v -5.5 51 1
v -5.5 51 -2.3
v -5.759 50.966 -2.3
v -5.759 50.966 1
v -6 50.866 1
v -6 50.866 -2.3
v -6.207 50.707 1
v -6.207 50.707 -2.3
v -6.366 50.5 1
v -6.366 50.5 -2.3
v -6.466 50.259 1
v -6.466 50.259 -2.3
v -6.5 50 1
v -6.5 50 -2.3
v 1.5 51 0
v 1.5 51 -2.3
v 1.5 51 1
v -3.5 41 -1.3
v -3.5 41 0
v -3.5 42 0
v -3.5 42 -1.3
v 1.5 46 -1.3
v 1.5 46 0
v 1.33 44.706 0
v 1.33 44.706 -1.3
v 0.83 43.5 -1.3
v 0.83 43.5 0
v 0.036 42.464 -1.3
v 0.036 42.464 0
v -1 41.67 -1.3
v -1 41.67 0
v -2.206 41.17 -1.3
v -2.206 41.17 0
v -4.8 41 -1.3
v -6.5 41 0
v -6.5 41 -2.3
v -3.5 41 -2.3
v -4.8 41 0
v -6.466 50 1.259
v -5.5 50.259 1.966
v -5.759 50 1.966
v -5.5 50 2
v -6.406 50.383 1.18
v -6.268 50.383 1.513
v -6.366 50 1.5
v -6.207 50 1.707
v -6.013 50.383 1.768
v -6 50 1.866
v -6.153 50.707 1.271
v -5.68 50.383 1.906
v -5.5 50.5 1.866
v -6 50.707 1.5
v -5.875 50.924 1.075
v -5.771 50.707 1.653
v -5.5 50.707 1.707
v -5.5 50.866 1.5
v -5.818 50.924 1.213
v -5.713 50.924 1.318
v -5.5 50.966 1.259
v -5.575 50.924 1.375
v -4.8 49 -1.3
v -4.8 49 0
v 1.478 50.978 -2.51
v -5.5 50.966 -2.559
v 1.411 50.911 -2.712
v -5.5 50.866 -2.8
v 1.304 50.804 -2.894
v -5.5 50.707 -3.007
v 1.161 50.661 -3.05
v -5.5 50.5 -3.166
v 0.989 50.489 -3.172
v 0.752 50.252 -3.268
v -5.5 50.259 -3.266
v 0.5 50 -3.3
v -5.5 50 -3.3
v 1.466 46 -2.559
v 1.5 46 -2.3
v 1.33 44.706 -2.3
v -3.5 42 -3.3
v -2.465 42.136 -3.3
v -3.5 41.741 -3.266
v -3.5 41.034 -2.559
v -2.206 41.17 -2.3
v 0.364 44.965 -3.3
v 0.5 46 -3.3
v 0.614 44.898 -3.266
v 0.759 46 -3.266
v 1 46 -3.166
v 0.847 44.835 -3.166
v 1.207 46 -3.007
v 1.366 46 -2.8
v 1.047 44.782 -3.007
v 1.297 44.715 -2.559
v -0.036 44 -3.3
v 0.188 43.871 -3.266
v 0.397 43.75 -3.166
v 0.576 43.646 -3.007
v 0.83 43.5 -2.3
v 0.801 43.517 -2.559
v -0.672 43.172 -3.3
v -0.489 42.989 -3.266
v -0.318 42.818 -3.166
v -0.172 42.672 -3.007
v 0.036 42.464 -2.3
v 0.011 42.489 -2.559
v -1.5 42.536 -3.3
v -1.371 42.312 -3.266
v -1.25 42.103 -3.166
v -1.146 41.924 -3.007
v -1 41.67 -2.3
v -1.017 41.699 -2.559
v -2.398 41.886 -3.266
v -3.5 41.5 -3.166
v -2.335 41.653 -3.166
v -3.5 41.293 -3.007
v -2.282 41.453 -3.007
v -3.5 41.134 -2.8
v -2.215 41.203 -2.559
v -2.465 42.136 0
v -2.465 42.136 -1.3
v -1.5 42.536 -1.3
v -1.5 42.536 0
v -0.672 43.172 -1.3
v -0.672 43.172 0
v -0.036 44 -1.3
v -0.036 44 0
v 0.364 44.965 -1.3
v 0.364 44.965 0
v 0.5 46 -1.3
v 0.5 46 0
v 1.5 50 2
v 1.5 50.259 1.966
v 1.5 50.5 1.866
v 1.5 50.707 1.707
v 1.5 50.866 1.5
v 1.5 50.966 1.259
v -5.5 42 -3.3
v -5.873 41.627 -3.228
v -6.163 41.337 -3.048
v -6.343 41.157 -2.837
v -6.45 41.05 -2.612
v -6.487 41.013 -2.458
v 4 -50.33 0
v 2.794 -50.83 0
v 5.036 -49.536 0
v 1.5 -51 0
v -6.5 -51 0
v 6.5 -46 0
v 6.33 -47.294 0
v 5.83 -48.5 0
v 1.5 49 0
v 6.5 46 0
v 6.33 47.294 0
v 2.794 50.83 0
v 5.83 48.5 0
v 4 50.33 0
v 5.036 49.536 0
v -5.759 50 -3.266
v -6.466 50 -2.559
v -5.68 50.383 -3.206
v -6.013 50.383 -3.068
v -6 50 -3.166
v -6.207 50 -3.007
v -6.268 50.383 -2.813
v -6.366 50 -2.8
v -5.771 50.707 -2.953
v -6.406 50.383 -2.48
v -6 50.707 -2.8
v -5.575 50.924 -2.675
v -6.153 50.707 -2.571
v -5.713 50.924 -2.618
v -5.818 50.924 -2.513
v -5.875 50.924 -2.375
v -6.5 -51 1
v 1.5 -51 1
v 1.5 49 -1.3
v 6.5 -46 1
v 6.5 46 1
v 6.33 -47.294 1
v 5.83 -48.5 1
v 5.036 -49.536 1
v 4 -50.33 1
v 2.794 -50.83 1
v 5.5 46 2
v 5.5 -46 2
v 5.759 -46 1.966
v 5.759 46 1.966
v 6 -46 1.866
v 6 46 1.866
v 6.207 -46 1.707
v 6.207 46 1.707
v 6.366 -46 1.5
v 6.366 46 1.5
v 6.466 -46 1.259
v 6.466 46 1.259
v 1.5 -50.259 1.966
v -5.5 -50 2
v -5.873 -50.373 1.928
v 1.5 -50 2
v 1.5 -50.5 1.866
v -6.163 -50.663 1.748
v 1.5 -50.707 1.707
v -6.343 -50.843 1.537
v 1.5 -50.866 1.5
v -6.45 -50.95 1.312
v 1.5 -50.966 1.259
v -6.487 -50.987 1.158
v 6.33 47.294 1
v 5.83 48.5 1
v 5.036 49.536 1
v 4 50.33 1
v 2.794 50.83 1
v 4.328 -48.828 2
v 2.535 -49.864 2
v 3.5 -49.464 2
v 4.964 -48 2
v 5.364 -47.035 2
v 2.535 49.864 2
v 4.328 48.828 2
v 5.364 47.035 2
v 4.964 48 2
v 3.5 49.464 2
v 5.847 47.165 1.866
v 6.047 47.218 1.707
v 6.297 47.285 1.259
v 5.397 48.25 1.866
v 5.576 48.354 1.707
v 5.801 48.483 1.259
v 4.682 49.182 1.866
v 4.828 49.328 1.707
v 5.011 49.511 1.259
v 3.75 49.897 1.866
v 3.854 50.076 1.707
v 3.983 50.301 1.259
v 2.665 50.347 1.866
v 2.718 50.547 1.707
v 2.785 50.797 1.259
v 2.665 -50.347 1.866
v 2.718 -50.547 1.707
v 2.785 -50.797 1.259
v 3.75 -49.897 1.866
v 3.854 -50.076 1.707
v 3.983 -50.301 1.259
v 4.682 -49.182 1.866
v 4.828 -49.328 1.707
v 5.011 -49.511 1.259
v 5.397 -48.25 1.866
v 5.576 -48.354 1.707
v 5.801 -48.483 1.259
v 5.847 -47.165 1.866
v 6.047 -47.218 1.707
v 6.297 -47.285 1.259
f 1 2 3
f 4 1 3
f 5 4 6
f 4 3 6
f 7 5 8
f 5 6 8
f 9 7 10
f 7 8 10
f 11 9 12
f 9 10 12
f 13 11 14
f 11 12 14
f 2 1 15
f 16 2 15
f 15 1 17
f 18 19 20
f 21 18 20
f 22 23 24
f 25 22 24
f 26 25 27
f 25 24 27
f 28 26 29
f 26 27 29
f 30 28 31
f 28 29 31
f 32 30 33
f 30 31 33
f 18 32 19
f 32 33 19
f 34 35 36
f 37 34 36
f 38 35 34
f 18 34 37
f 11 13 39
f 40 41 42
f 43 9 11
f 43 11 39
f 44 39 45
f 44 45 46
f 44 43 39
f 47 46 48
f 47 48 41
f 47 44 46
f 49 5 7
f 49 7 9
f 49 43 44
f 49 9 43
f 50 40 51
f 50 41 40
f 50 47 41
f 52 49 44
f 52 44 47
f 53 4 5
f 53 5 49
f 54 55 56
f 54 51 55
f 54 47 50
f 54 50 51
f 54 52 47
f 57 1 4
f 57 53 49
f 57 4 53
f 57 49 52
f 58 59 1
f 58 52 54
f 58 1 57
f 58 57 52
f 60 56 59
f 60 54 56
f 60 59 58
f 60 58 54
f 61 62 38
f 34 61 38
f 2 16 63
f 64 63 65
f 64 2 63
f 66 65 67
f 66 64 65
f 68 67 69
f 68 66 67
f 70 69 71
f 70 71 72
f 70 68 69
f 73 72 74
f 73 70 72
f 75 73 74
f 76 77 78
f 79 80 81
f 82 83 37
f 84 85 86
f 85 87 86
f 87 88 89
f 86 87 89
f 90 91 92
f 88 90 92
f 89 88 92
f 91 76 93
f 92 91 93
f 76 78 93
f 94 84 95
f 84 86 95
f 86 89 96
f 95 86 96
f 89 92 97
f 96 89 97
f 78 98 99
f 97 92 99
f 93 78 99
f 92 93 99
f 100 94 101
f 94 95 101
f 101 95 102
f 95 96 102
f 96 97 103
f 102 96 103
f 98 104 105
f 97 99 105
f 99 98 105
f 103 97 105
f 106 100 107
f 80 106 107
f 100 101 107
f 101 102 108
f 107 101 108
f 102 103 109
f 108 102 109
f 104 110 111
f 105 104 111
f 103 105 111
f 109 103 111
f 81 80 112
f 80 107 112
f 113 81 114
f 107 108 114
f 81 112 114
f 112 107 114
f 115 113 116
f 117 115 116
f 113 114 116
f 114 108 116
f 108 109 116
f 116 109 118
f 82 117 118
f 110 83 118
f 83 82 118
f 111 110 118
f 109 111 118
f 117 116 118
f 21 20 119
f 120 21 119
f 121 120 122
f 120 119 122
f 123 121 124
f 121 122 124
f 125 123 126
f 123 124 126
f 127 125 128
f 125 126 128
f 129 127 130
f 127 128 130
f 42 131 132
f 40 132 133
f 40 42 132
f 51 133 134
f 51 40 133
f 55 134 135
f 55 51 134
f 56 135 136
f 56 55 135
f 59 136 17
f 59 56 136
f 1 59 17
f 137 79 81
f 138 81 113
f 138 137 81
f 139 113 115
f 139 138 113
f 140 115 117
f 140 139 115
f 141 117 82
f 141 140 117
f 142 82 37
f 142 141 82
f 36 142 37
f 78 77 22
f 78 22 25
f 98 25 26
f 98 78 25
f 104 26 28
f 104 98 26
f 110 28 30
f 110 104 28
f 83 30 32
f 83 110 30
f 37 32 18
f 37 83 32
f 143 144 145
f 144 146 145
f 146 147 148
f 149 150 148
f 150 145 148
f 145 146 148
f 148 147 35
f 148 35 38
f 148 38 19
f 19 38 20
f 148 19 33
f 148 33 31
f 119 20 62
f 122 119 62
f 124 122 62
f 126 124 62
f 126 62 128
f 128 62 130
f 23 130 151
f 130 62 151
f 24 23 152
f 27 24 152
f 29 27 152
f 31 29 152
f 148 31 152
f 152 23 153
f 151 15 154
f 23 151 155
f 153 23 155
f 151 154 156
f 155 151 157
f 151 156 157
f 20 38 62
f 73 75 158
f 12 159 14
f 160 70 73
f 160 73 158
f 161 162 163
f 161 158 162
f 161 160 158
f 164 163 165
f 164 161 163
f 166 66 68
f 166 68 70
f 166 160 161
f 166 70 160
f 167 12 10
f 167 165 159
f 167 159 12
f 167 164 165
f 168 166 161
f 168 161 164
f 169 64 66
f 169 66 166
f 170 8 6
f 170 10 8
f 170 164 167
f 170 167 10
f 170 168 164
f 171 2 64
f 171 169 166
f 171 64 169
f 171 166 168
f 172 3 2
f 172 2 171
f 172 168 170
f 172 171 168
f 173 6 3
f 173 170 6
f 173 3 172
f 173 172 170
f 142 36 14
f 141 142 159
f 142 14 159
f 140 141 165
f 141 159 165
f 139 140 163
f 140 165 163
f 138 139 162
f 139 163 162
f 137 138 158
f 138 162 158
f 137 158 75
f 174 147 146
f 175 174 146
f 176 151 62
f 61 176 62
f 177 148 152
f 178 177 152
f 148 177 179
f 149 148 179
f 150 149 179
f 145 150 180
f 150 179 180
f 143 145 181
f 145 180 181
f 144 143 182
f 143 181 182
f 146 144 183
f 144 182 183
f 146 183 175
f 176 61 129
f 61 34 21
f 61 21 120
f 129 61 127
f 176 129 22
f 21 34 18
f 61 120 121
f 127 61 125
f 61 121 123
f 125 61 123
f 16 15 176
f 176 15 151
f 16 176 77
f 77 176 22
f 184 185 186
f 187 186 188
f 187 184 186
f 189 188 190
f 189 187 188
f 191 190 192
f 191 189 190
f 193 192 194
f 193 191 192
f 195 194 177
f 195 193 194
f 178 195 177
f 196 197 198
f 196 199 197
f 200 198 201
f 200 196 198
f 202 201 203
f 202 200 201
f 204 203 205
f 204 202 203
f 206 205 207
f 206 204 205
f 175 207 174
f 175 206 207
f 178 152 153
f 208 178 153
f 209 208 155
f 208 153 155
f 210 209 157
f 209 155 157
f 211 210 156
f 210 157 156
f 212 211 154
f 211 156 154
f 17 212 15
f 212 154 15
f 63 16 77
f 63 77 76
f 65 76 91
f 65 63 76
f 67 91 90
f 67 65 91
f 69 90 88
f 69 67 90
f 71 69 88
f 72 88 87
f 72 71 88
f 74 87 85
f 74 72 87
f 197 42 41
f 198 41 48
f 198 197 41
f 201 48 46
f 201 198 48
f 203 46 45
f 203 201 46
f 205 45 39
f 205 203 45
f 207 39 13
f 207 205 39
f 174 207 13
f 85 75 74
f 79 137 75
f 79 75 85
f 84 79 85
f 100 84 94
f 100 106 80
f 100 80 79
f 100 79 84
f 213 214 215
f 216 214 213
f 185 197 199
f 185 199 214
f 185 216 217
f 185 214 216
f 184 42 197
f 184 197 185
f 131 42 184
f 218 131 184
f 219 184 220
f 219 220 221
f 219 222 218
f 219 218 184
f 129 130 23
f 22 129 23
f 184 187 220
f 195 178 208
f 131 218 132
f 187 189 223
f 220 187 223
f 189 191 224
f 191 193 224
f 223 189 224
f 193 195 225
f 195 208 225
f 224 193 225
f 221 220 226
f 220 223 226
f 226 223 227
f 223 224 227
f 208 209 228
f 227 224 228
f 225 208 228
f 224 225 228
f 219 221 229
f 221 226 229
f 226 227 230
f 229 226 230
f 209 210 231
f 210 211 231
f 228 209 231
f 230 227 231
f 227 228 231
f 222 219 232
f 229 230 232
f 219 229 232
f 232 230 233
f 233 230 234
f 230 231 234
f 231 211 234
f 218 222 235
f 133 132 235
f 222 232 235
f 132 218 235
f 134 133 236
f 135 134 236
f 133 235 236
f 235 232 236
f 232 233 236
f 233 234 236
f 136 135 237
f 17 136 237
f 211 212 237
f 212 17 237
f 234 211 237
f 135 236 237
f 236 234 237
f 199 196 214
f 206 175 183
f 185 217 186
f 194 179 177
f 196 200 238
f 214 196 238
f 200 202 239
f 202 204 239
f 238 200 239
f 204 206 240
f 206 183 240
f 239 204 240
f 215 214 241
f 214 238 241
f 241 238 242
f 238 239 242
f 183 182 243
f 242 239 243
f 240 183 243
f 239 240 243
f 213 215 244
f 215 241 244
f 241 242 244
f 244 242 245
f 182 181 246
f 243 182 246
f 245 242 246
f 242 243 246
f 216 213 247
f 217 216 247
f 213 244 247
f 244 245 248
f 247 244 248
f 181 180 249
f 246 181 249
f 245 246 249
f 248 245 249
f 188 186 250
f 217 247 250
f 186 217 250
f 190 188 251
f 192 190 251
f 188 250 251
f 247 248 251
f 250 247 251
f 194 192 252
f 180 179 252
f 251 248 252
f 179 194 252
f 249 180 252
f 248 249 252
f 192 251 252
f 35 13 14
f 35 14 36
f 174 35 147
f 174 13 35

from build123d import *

# Parameters (mm, degrees)
F1_DEPTH     = 2
F2_W         = 1.7
F2_H         = 2
F2_W_2       = 6.3
F2_H_2       = 8
F3_DEPTH     = 1.3
F4_W         = 8
F4_H         = 10
F5_DEPTH     = 2
F6_R         = 5
F7_R         = 1
F8_T1_DEPTH  = 3.3
F8_T3_DEPTH  = 7.5
F8_T5_DEPTH  = 9.5
F8_T7_DEPTH  = 5.5
F8_T9_DEPTH  = 11.5
F8_S13_W     = 1
F8_S13_H     = 1
F8_T14_DEPTH = 1
F8_S19_W     = 1
F8_S19_H     = 1
F8_T20_DEPTH = 1
F8_T24_ANGLE = 90
F10_DEPTH    = 1.3


# Not quite as in the source:
# - a fillet or chamfer that OpenCascade refuses, or shapes differently, is made with other operations: its cross-section is extruded or revolved along the edge and cut away or added


with BuildPart() as f1:
    # F0 (on Top) → F1 (new body)
    with BuildSketch(Plane.XY):
        with BuildLine():
            Line((-6.5, -51), (6.5, -51))
            Line((6.5, -51), (6.5, 46))
            ThreePointArc((6.5, 46), (5.0355339059, 49.5355339059), (1.5, 51))
            Line((1.5, 51), (-6.5, 51))
            Line((-6.5, 51), (-6.5, -51))
        make_face()
    extrude(amount=F1_DEPTH)

    # F2 (on face) → F3 (join)
    with BuildSketch(Plane(origin=(0, 0, 0), x_dir=(1, 0, 0), z_dir=(0, 0, -1))):
        with Locations((-5.65, -50)):
            Rectangle(F2_W, F2_H)
        with Locations((-1.65, -50)):
            Rectangle(F2_W_2, F2_H)
        with Locations((-5.65, -45)):
            Rectangle(F2_W, F2_H_2)
    extrude(amount=F3_DEPTH)

    # F4 (on face) → F5 (join)
    with BuildSketch(Plane(origin=(0, 0, -1.3), x_dir=(1, 0, 0), z_dir=(0, 0, -1))):
        with Locations((-2.5, -46)):
            Rectangle(F4_W, F4_H)
    extrude(amount=F5_DEPTH)

    # F6
    f6_edges = [f1.edges().sort_by_distance(p)[0] for p in [
        (6.5, -51, 1),
        (1.5, 41, -2.3),
    ]]
    fillet(f6_edges, radius=F6_R)

    # F7
    f7_edges = [f1.edges().sort_by_distance(p)[0] for p in [
        (-2.5, -51, 2),
        (5.035534, -49.535534, 2),
        (-6.5, 0, 2),
        (6.5, 0, 2),
        (-2.5, 51, 2),
        (5.035534, 49.535534, 2),
    ]]
    fillet(f7_edges, radius=F7_R)

    # F8: fillet of radius 1 on 6 edges, made by hand

    # F8_s2 → F8_t1 (cut)
    with BuildSketch(Plane.XY.offset(-2.3)):
        with BuildLine():
            ThreePointArc((-5.5, 51), (-6.2071067812, 50.7071067812), (-6.5, 50))
            Line((-6.5, 50), (-6.5, 51))
            Line((-6.5, 51), (-5.5, 51))
        make_face()
    extrude(amount=F8_T1_DEPTH, mode=Mode.SUBTRACT)

    # F8_s4 → F8_t3 (cut)
    with BuildSketch(Plane.XZ.offset(-53.5)):
        with BuildLine():
            ThreePointArc((1.5, -2.3), (1.2071067812, -3.0071067812), (0.5, -3.3))
            Line((0.5, -3.3), (1.5, -3.3))
            Line((1.5, -3.3), (1.5, -2.3))
        make_face()
    extrude(amount=F8_T3_DEPTH, mode=Mode.SUBTRACT)

    # F8_s6 → F8_t5 (cut)
    with BuildSketch(Plane.YZ.offset(-5.5)):
        with BuildLine():
            ThreePointArc((51, -2.3), (50.7071067812, -3.0071067812), (50, -3.3))
            Line((50, -3.3), (51, -3.3))
            Line((51, -3.3), (51, -2.3))
        make_face()
    extrude(amount=F8_T5_DEPTH, mode=Mode.SUBTRACT)

    # F8_s8 → F8_t7 (cut)
    with BuildSketch(Plane.YZ.offset(-9)):
        with BuildLine():
            ThreePointArc((42, -3.3), (41.2928932188, -3.0071067812), (41, -2.3))
            Line((41, -2.3), (41, -3.3))
            Line((41, -3.3), (42, -3.3))
        make_face()
    extrude(amount=F8_T7_DEPTH, mode=Mode.SUBTRACT)

    # F8_s10 → F8_t9 (cut)
    with BuildSketch(Plane.XZ.offset(-50)):
        with BuildLine():
            ThreePointArc((-6.5, -2.3), (-6.2071067812, -3.0071067812), (-5.5, -3.3))
            Line((-5.5, -3.3), (-6.5, -3.3))
            Line((-6.5, -3.3), (-6.5, -2.3))
        make_face()
    extrude(amount=F8_T9_DEPTH, mode=Mode.SUBTRACT)


with BuildPart() as f8_tool12:
    # F8_s13 → F8_t14 (new body)
    with BuildSketch(Plane.XZ.offset(-50)):
        with Locations((-6, 1.5)):
            Rectangle(F8_S13_W, F8_S13_H)
    extrude(amount=-F8_T14_DEPTH)

    # F8_s15 → F8_t16 (revolve, cut)
    with BuildSketch(Plane(origin=(-5.5, 50, 1), x_dir=(0.7071067812, 0, -0.7071067812), z_dir=(0.7071067812, 0, 0.7071067812))):
        with BuildLine():
            ThreePointArc((0, -1), (1, 0), (0, 1))
            Line((0, 1), (0, -1))
        make_face()
    revolve(axis=Axis((-5.5, 50, 1), (0, 1, 0)), mode=Mode.SUBTRACT)


with BuildPart() as f1_1:
    add(f1.part)

    # F8_t11: cut F8_tool12
    add(f8_tool12.part, mode=Mode.SUBTRACT)


with BuildPart() as f8_tool18:
    # F8_s19 → F8_t20 (new body)
    with BuildSketch(Plane.XZ.offset(-50)):
        with Locations((-6, -2.8)):
            Rectangle(F8_S19_W, F8_S19_H)
    extrude(amount=-F8_T20_DEPTH)

    # F8_s21 → F8_t22 (revolve, cut)
    with BuildSketch(Plane(origin=(-5.5, 50, -2.3), x_dir=(0.7071067812, 0, 0.7071067812), z_dir=(-0.7071067812, 0, 0.7071067812))):
        with BuildLine():
            ThreePointArc((0, -1), (1, 0), (0, 1))
            Line((0, 1), (0, -1))
        make_face()
    revolve(axis=Axis((-5.5, 50, -2.3), (0, 1, 0)), mode=Mode.SUBTRACT)


with BuildPart() as f1_2:
    add(f1_1.part)

    # F8_t17: cut F8_tool18
    add(f8_tool18.part, mode=Mode.SUBTRACT)

    # F8_s23 → F8_t24 (revolve, cut)
    with BuildSketch(Plane.XZ.offset(-46)):
        with BuildLine():
            ThreePointArc((0.5, -3.3), (1.2071067812, -3.0071067812), (1.5, -2.3))
            Line((1.5, -2.3), (1.5, -3.3))
            Line((1.5, -3.3), (0.5, -3.3))
        make_face()
    revolve(axis=Axis((-3.5, 46, -3.3), (0, 0, -1)), revolution_arc=F8_T24_ANGLE, mode=Mode.SUBTRACT)

    # F9 (on face) → F10 (join, through all)
    with BuildSketch(Plane(origin=(0, 0, 0), x_dir=(1, 0, 0), z_dir=(0, 0, -1))):
        with BuildLine():
            ThreePointArc((-3.5, -42), (-0.6715728753, -43.1715728753), (0.5, -46))
            Line((0.5, -46), (1.5, -46))
            ThreePointArc((1.5, -46), (0.0355339059, -42.4644660941), (-3.5, -41))
            Line((-3.5, -41), (-3.5, -42))
        make_face()
    extrude(amount=F10_DEPTH)


solid = f1_2.part
